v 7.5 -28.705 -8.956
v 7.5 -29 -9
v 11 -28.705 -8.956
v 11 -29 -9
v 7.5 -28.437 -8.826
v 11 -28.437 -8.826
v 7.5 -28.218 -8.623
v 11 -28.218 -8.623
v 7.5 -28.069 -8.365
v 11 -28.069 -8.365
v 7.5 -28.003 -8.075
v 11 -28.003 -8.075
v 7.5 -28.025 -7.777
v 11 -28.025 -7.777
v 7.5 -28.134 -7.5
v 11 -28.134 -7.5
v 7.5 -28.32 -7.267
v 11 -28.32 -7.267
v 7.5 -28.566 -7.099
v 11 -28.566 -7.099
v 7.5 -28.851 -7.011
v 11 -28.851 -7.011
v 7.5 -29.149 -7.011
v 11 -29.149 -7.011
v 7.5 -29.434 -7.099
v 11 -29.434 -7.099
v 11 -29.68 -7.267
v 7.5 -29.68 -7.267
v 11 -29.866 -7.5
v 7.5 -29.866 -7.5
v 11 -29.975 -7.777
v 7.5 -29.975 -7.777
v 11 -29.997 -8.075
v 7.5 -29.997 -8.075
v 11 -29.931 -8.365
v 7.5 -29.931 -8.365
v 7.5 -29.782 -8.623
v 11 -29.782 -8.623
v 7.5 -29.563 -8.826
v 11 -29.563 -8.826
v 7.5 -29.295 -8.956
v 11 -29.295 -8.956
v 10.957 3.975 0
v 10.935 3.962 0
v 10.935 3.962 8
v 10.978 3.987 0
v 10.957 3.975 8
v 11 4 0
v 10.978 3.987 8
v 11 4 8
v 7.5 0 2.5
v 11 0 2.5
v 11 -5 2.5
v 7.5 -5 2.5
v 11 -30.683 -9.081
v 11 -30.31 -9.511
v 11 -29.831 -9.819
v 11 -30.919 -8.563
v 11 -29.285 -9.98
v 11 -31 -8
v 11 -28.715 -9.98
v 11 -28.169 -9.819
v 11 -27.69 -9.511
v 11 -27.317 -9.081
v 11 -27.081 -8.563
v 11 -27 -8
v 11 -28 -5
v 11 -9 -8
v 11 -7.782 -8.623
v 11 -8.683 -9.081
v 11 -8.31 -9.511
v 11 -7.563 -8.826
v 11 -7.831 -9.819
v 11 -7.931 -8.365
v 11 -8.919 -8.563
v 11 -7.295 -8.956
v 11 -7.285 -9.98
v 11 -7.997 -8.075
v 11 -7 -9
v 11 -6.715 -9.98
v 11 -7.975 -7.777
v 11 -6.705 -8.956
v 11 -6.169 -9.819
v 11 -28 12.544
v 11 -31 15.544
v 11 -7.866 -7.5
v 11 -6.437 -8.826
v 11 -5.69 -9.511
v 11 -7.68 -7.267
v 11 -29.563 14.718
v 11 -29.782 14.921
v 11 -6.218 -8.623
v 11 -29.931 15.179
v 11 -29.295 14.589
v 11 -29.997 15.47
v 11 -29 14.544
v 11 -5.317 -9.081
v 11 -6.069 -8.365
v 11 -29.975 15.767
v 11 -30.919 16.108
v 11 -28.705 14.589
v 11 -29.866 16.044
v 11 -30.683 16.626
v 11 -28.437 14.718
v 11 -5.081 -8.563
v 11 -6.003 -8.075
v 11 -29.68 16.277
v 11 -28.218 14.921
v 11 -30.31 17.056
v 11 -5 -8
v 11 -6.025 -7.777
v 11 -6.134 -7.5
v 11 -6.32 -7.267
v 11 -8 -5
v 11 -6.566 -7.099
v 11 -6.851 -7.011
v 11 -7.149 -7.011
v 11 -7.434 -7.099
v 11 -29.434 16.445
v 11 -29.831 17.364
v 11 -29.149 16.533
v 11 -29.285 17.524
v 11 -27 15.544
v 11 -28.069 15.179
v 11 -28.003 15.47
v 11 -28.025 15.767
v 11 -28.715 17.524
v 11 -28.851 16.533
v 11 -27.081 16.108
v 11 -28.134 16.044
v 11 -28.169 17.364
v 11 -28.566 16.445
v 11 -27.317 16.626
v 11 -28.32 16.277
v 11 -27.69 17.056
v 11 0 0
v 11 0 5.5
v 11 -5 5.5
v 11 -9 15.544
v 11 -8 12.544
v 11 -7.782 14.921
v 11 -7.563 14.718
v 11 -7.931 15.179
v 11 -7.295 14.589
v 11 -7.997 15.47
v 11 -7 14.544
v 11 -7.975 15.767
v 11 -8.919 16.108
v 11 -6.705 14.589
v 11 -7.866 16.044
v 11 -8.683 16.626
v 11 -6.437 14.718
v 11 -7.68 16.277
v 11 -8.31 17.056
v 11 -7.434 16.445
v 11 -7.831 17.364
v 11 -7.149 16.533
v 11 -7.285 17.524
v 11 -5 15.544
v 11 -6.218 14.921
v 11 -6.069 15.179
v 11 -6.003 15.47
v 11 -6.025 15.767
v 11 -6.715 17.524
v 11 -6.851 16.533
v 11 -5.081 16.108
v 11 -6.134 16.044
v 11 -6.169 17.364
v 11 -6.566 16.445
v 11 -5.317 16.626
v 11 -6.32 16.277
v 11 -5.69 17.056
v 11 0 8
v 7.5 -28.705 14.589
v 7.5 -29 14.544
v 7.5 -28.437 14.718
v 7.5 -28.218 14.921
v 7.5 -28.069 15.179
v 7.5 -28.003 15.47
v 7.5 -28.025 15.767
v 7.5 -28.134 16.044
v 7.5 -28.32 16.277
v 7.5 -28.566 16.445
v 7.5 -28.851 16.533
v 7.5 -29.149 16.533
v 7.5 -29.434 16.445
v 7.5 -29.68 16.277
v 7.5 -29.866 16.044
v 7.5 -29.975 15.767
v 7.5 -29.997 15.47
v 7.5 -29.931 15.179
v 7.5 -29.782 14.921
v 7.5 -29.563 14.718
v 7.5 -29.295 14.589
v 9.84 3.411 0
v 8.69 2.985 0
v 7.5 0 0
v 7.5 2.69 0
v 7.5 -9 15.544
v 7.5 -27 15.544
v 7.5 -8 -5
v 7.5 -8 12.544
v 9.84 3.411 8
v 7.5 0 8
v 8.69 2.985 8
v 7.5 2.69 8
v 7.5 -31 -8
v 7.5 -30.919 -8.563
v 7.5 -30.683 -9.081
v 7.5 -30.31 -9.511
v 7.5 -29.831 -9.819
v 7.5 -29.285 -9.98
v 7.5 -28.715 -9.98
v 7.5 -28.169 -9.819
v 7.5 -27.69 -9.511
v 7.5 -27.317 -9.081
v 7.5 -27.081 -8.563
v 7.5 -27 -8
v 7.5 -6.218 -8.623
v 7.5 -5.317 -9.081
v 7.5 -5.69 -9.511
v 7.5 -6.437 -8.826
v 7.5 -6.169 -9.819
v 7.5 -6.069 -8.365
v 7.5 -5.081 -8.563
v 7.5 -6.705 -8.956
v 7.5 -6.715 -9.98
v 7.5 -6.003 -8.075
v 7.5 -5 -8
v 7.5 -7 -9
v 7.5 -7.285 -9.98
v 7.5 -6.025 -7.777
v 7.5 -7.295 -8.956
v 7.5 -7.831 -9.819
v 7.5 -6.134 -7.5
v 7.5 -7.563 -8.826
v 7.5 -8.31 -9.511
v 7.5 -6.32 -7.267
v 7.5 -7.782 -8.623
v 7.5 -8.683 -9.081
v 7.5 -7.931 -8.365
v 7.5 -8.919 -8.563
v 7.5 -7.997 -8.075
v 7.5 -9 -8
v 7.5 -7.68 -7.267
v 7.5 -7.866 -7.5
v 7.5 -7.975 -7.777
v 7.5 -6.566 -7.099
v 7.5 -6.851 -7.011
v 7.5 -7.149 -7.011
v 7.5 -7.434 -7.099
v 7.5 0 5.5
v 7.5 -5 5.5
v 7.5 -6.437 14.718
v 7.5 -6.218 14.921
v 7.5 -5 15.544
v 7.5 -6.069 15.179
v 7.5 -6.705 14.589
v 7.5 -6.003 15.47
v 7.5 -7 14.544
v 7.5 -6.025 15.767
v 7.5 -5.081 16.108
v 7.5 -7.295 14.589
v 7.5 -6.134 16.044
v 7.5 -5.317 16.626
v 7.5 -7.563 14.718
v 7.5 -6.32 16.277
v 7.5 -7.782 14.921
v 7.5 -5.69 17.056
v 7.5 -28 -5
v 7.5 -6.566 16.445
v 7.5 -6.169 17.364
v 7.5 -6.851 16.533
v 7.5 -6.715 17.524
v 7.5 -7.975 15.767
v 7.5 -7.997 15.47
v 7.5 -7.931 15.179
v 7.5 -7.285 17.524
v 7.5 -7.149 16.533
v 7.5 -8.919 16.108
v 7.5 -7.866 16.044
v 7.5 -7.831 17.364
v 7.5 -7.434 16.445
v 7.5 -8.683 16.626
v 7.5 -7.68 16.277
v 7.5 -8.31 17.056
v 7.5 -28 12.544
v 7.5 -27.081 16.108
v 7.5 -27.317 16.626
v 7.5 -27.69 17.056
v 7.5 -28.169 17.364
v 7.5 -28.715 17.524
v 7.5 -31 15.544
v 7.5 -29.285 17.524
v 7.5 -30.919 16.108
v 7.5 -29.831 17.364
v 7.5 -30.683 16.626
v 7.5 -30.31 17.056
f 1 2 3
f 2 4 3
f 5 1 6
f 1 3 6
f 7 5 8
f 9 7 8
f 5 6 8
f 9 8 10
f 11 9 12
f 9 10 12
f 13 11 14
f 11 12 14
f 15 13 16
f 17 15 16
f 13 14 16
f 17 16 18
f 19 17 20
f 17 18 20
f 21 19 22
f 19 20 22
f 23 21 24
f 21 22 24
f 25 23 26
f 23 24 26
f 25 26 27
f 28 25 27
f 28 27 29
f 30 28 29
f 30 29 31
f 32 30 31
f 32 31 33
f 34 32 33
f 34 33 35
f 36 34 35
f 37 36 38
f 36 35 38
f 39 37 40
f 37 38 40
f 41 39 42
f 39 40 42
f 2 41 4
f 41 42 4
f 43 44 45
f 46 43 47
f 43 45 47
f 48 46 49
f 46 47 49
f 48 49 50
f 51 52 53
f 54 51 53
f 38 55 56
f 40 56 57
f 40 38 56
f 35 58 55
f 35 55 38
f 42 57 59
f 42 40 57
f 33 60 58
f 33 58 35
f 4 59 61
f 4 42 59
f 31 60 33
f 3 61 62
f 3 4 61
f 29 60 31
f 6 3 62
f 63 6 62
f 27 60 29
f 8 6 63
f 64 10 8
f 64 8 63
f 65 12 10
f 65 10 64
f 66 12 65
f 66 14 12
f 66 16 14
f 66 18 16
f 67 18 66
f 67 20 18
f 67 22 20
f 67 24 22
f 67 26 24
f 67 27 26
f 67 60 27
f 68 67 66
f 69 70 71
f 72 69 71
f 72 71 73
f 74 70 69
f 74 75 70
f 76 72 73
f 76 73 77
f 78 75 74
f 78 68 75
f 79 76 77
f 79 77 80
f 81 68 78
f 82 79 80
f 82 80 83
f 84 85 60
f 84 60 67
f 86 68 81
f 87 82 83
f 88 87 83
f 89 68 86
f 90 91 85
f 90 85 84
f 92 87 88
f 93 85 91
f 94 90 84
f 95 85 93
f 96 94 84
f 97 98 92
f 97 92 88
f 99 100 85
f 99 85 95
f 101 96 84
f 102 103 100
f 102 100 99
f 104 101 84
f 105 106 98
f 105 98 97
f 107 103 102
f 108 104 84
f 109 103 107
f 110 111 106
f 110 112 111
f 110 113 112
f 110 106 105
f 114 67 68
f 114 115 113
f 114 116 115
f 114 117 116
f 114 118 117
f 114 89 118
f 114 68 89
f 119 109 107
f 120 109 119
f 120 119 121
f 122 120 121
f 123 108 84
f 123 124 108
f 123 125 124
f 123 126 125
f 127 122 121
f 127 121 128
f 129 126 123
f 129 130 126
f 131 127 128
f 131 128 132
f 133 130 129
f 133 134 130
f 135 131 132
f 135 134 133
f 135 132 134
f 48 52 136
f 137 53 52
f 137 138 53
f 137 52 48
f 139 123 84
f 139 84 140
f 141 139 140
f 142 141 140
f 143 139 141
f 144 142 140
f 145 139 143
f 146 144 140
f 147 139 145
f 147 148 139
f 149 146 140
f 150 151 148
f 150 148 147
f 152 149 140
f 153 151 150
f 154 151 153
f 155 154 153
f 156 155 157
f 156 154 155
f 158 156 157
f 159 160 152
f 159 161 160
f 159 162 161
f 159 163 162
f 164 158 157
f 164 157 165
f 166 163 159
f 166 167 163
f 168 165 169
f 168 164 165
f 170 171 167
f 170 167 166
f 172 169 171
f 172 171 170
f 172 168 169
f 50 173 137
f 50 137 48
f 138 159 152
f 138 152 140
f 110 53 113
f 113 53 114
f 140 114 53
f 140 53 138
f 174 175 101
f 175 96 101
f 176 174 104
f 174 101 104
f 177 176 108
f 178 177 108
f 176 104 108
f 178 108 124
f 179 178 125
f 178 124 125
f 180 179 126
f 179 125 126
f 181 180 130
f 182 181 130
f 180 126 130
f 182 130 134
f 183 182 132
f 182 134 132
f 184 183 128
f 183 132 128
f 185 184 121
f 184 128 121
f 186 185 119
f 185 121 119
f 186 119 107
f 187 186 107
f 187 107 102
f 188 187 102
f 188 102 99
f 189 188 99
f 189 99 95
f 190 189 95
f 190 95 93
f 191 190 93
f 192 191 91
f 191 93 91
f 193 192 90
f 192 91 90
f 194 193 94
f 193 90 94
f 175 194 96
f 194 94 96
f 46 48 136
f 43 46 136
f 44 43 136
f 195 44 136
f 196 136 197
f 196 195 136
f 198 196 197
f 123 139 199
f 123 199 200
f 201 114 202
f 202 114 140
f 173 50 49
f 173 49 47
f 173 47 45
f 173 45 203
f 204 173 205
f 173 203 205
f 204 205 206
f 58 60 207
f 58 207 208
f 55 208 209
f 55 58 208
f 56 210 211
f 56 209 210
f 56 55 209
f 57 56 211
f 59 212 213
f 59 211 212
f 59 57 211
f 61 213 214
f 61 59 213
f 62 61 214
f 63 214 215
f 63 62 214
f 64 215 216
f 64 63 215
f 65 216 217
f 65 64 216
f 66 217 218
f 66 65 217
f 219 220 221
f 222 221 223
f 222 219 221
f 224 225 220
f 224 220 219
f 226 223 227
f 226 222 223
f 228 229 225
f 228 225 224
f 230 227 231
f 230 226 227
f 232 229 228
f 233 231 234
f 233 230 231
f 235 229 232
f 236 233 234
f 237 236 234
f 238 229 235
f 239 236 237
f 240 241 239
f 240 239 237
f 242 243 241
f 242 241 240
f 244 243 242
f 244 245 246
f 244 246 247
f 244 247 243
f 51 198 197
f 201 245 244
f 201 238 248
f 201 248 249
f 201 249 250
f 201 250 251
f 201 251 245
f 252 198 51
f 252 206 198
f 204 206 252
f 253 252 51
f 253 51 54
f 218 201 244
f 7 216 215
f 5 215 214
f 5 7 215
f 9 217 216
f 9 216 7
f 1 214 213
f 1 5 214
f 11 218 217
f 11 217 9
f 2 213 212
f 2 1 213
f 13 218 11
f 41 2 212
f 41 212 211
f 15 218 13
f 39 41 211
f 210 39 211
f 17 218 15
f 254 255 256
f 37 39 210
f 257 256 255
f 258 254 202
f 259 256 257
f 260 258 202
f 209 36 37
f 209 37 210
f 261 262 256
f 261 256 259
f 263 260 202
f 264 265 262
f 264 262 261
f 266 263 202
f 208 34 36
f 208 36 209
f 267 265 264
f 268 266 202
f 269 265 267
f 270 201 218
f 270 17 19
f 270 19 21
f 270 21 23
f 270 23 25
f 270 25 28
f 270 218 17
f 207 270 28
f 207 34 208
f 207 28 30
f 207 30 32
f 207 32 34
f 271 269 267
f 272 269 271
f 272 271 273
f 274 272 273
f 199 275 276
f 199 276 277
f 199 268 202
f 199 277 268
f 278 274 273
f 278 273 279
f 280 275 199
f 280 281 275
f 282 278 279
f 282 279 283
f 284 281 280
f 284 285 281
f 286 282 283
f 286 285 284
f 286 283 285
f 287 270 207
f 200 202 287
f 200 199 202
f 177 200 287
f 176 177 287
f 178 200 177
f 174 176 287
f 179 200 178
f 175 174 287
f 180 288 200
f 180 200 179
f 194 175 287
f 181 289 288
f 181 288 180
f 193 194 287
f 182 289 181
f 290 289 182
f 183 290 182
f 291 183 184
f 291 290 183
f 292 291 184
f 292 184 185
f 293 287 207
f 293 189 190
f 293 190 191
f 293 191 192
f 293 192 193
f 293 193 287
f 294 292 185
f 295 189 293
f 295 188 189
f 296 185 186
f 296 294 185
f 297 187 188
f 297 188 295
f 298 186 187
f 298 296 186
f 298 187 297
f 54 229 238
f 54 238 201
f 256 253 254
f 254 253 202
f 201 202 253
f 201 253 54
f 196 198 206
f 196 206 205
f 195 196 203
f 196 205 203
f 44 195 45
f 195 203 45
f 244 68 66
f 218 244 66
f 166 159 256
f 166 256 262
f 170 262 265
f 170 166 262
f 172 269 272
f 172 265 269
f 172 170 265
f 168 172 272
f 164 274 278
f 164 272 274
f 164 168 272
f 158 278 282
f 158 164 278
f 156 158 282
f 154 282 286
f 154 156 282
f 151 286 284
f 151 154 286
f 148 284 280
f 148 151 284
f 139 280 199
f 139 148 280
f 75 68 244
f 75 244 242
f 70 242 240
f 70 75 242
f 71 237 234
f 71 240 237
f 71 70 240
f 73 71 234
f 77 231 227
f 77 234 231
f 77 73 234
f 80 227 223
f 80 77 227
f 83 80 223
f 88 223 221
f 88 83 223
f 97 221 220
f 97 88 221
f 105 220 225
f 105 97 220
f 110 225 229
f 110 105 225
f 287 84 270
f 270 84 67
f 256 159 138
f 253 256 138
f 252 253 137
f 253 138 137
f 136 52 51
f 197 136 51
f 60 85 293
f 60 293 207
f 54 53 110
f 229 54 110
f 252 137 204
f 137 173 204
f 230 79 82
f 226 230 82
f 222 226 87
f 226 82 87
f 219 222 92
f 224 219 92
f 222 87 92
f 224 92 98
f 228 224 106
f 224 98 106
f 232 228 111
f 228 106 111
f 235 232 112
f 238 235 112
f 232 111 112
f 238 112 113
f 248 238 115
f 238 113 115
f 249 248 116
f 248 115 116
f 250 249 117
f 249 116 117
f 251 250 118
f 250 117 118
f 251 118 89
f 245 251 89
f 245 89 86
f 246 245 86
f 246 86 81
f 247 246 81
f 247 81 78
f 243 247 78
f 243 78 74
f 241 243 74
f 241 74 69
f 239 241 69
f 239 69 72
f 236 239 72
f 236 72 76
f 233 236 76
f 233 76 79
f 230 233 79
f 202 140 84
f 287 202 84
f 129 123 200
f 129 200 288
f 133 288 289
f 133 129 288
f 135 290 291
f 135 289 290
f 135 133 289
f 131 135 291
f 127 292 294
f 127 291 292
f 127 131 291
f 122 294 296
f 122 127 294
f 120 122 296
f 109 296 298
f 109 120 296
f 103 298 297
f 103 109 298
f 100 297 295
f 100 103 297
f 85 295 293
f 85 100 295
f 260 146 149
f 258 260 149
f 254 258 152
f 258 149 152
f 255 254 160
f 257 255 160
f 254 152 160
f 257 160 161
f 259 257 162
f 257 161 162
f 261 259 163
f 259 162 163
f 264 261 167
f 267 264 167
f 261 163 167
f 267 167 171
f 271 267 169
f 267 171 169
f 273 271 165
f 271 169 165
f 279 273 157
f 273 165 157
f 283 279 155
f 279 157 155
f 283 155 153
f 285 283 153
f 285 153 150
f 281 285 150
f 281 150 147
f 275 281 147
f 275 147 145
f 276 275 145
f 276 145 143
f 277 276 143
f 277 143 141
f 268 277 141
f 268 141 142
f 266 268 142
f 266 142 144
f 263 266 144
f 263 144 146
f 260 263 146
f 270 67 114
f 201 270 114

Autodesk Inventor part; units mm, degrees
ref_plane "Work Plane1" through (11, 2.9624, 8) normal (0, 0, -1) x (-1, 0, 0)
sketch "Sketch1" plane through (11, 2.9624, 8) normal (0, 0, -1) x (-1, 0, 0)
  arc A0 (0.0647, 1) -> (3.5, -0.2722) centre (5.5324, 10.4896) ccw projected
  line L0 (0, -2.9624) -> (0, 1) projected
  line L1 (3.5, -0.2722) -> (3.5, -2.9624) projected
  line L2 (0, -2.9624) -> (3.5, -2.9624) projected
  arc A1 (0, 1.0376) -> (11, 1) centre (5.5324, 10.4896) ccw projected
  line L3 (0, -7.9624) -> (0, 1.0376) projected
  line L4 (3.5, -0.2722) -> (3.5, -2.9624)
  line L5 (0, -2.9624) -> (3.5, -2.9624)
  line L6 (0, -2.9624) -> (0, 1.0376)
  arc A2 (0, 1.0376) -> (11, 1) centre (5.5324, 10.4896) ccw
  point P0 (11, -2.9624)
ref_plane "Work Plane2" through (8, 0, 0) normal (0, 0, 1) x (1, 0, 0)
ref_plane "Work Plane4" through (8, 0, 0) normal (0, 0, 1) x (1, 0, 0)
extrude "Extrusion1" add sketch "Sketch1" along normal up to surface (8 mm away)
ref_plane "Work Plane3" through (8, -5, 14.5) normal (-1, 0, 0) x (0, 0, 1)
ref_plane "Work Plane5" through (11, -5, -9) normal (1, 0, 0) x (0, 1, 0)
sketch "Sketch2" plane through (8, -5, 14.5) normal (-1, 0, 0) x (0, 0, 1)
  line L0 (-6.5, 5) -> (-14.5, 5) projected
  line L1 (-12, 5) -> (-12, 0) projected
  line L2 (-12, 5) -> (-12, 0)
  line L3 (-12, 5) -> (-9.4556, 5)
  line L4 (-12, 0) -> (-22.5, 0)
  line L5 (-22.5, 0) -> (-22.5, -26)
  line L6 (1.0444, 0) -> (1.0444, -26)
  line L7 (1.0444, -26) -> (-22.5, -26)
  line L8 (-22.5, 0) -> (-19.5, 0)
  line L9 (-19.5, 0) -> (-19.5, -3)
  line L10 (1.0444, -26) -> (1.0444, -23)
  line L11 (1.0444, -23) -> (-1.9556, -23)
  line L12 (-19.5, -3) -> (-1.9556, -3)
  line L13 (-1.9556, -3) -> (-1.9556, -23)
  line L14 (-1.9556, -23) -> (-19.5, -23)
  line L15 (-19.5, -23) -> (-19.5, -3)
  line L16 (1.0444, -26) -> (-0.9556, -26)
  line L17 (-0.9556, -26) -> (-2.9556, -26)
  line L18 (-22.5, 0) -> (-22.5, -4)
  line L19 (-22.5, -4) -> (-22.5, -2)
  line L20 (-22.5, -2) -> (-24.5, -2)
  line L21 (1.0444, 0) -> (1.0444, -4)
  line L22 (1.0444, -2) -> (3.0444, -2)
  arc A0 (-22.5, 0) -> (-22.5, -4) centre (-22.5, -2) ccw
  arc A1 (1.0444, -4) -> (1.0444, 0) centre (1.0444, -2) ccw
  line L23 (-9, 0) -> (-9, 5) projected
  line L24 (-12, 5) -> (-9, 5)
  line L25 (-9, 5) -> (-9, 0)
  line L26 (1.0444, 0) -> (-9, 0)
  line L27 (-22.5, -26) -> (-22.5, -24)
  line L28 (-22.5, -24) -> (-24.5, -24)
  line L29 (1.0444, -26) -> (1.0444, -24)
  line L30 (1.0444, -24) -> (3.0444, -24)
  line L31 (-22.5, -24) -> (-22.5, -22)
  line L32 (1.0444, -24) -> (1.0444, -22)
  arc A2 (-22.5, -22) -> (-22.5, -26) centre (-22.5, -24) ccw
  arc A3 (1.0444, -26) -> (1.0444, -22) centre (1.0444, -24) ccw
  line L33 (-19.5, -23) -> (-1.9556, -23)
  line L34 (-1.9556, -3) -> (-1.9556, -23)
  point P0 (-18.5, -26)
  dimension "d3" = 10.5
  dimension "d4" = 26
  dimension "d5" = 3
  dimension "d6" = 3
  dimension "d8" = 3
  dimension "d16" = 4
  dimension "d17" = 2
  dimension "d18" = 4
  dimension "d19" = 2
  dimension "d28" = 2
  dimension "d29" = 2
  dimension "d30" = 2
  dimension "d31" = 2
  dimension "d32" = 2
extrude "Extrusion2" add sketch "Sketch2" along normal up to surface (3.5 mm away) from surface at -3 contours L23 L26 L6 L11 L13 L12 L9 L4 L1 L0 | A1 L22 L6 | L22 A1 L6 | L9 L15 L14 L11 L6 L7 L5 L4 | L5 L20 A0 | A3 L30 L6 | L5 A0 L20 | A3 L6 L30 | L5 L28 A2 | L5 A2 L28
sketch "Sketch3" plane through (11, 0, 8) normal (1, 0, 0) x (0, 0, -1)
  arc A0 (-7.5444, -5) -> (-7.5444, -9) centre (-7.5444, -7) ccw projected
  arc A1 (16, -9) -> (16, -5) centre (16, -7) ccw projected
  circle A2 centre (16, -7) radius 1
  circle A3 centre (-7.5444, -7) radius 1
  arc A4 (-7.5444, -27) -> (-7.5444, -31) centre (-7.5444, -29) ccw projected
  arc A5 (16, -31) -> (16, -27) centre (16, -29) ccw projected
  circle A6 centre (16, -29) radius 1
  circle A7 centre (-7.5444, -29) radius 1
  point P0 (-5.5444, -31)
  dimension "d23" = 2
  dimension "d25" = 2
  dimension "d33" = 2
  dimension "d34" = 2
extrude "Extrusion3" cut sketch "Sketch3" against normal up to surface (3.5 mm away)
properties part number "back_pack_side_clip_in"
